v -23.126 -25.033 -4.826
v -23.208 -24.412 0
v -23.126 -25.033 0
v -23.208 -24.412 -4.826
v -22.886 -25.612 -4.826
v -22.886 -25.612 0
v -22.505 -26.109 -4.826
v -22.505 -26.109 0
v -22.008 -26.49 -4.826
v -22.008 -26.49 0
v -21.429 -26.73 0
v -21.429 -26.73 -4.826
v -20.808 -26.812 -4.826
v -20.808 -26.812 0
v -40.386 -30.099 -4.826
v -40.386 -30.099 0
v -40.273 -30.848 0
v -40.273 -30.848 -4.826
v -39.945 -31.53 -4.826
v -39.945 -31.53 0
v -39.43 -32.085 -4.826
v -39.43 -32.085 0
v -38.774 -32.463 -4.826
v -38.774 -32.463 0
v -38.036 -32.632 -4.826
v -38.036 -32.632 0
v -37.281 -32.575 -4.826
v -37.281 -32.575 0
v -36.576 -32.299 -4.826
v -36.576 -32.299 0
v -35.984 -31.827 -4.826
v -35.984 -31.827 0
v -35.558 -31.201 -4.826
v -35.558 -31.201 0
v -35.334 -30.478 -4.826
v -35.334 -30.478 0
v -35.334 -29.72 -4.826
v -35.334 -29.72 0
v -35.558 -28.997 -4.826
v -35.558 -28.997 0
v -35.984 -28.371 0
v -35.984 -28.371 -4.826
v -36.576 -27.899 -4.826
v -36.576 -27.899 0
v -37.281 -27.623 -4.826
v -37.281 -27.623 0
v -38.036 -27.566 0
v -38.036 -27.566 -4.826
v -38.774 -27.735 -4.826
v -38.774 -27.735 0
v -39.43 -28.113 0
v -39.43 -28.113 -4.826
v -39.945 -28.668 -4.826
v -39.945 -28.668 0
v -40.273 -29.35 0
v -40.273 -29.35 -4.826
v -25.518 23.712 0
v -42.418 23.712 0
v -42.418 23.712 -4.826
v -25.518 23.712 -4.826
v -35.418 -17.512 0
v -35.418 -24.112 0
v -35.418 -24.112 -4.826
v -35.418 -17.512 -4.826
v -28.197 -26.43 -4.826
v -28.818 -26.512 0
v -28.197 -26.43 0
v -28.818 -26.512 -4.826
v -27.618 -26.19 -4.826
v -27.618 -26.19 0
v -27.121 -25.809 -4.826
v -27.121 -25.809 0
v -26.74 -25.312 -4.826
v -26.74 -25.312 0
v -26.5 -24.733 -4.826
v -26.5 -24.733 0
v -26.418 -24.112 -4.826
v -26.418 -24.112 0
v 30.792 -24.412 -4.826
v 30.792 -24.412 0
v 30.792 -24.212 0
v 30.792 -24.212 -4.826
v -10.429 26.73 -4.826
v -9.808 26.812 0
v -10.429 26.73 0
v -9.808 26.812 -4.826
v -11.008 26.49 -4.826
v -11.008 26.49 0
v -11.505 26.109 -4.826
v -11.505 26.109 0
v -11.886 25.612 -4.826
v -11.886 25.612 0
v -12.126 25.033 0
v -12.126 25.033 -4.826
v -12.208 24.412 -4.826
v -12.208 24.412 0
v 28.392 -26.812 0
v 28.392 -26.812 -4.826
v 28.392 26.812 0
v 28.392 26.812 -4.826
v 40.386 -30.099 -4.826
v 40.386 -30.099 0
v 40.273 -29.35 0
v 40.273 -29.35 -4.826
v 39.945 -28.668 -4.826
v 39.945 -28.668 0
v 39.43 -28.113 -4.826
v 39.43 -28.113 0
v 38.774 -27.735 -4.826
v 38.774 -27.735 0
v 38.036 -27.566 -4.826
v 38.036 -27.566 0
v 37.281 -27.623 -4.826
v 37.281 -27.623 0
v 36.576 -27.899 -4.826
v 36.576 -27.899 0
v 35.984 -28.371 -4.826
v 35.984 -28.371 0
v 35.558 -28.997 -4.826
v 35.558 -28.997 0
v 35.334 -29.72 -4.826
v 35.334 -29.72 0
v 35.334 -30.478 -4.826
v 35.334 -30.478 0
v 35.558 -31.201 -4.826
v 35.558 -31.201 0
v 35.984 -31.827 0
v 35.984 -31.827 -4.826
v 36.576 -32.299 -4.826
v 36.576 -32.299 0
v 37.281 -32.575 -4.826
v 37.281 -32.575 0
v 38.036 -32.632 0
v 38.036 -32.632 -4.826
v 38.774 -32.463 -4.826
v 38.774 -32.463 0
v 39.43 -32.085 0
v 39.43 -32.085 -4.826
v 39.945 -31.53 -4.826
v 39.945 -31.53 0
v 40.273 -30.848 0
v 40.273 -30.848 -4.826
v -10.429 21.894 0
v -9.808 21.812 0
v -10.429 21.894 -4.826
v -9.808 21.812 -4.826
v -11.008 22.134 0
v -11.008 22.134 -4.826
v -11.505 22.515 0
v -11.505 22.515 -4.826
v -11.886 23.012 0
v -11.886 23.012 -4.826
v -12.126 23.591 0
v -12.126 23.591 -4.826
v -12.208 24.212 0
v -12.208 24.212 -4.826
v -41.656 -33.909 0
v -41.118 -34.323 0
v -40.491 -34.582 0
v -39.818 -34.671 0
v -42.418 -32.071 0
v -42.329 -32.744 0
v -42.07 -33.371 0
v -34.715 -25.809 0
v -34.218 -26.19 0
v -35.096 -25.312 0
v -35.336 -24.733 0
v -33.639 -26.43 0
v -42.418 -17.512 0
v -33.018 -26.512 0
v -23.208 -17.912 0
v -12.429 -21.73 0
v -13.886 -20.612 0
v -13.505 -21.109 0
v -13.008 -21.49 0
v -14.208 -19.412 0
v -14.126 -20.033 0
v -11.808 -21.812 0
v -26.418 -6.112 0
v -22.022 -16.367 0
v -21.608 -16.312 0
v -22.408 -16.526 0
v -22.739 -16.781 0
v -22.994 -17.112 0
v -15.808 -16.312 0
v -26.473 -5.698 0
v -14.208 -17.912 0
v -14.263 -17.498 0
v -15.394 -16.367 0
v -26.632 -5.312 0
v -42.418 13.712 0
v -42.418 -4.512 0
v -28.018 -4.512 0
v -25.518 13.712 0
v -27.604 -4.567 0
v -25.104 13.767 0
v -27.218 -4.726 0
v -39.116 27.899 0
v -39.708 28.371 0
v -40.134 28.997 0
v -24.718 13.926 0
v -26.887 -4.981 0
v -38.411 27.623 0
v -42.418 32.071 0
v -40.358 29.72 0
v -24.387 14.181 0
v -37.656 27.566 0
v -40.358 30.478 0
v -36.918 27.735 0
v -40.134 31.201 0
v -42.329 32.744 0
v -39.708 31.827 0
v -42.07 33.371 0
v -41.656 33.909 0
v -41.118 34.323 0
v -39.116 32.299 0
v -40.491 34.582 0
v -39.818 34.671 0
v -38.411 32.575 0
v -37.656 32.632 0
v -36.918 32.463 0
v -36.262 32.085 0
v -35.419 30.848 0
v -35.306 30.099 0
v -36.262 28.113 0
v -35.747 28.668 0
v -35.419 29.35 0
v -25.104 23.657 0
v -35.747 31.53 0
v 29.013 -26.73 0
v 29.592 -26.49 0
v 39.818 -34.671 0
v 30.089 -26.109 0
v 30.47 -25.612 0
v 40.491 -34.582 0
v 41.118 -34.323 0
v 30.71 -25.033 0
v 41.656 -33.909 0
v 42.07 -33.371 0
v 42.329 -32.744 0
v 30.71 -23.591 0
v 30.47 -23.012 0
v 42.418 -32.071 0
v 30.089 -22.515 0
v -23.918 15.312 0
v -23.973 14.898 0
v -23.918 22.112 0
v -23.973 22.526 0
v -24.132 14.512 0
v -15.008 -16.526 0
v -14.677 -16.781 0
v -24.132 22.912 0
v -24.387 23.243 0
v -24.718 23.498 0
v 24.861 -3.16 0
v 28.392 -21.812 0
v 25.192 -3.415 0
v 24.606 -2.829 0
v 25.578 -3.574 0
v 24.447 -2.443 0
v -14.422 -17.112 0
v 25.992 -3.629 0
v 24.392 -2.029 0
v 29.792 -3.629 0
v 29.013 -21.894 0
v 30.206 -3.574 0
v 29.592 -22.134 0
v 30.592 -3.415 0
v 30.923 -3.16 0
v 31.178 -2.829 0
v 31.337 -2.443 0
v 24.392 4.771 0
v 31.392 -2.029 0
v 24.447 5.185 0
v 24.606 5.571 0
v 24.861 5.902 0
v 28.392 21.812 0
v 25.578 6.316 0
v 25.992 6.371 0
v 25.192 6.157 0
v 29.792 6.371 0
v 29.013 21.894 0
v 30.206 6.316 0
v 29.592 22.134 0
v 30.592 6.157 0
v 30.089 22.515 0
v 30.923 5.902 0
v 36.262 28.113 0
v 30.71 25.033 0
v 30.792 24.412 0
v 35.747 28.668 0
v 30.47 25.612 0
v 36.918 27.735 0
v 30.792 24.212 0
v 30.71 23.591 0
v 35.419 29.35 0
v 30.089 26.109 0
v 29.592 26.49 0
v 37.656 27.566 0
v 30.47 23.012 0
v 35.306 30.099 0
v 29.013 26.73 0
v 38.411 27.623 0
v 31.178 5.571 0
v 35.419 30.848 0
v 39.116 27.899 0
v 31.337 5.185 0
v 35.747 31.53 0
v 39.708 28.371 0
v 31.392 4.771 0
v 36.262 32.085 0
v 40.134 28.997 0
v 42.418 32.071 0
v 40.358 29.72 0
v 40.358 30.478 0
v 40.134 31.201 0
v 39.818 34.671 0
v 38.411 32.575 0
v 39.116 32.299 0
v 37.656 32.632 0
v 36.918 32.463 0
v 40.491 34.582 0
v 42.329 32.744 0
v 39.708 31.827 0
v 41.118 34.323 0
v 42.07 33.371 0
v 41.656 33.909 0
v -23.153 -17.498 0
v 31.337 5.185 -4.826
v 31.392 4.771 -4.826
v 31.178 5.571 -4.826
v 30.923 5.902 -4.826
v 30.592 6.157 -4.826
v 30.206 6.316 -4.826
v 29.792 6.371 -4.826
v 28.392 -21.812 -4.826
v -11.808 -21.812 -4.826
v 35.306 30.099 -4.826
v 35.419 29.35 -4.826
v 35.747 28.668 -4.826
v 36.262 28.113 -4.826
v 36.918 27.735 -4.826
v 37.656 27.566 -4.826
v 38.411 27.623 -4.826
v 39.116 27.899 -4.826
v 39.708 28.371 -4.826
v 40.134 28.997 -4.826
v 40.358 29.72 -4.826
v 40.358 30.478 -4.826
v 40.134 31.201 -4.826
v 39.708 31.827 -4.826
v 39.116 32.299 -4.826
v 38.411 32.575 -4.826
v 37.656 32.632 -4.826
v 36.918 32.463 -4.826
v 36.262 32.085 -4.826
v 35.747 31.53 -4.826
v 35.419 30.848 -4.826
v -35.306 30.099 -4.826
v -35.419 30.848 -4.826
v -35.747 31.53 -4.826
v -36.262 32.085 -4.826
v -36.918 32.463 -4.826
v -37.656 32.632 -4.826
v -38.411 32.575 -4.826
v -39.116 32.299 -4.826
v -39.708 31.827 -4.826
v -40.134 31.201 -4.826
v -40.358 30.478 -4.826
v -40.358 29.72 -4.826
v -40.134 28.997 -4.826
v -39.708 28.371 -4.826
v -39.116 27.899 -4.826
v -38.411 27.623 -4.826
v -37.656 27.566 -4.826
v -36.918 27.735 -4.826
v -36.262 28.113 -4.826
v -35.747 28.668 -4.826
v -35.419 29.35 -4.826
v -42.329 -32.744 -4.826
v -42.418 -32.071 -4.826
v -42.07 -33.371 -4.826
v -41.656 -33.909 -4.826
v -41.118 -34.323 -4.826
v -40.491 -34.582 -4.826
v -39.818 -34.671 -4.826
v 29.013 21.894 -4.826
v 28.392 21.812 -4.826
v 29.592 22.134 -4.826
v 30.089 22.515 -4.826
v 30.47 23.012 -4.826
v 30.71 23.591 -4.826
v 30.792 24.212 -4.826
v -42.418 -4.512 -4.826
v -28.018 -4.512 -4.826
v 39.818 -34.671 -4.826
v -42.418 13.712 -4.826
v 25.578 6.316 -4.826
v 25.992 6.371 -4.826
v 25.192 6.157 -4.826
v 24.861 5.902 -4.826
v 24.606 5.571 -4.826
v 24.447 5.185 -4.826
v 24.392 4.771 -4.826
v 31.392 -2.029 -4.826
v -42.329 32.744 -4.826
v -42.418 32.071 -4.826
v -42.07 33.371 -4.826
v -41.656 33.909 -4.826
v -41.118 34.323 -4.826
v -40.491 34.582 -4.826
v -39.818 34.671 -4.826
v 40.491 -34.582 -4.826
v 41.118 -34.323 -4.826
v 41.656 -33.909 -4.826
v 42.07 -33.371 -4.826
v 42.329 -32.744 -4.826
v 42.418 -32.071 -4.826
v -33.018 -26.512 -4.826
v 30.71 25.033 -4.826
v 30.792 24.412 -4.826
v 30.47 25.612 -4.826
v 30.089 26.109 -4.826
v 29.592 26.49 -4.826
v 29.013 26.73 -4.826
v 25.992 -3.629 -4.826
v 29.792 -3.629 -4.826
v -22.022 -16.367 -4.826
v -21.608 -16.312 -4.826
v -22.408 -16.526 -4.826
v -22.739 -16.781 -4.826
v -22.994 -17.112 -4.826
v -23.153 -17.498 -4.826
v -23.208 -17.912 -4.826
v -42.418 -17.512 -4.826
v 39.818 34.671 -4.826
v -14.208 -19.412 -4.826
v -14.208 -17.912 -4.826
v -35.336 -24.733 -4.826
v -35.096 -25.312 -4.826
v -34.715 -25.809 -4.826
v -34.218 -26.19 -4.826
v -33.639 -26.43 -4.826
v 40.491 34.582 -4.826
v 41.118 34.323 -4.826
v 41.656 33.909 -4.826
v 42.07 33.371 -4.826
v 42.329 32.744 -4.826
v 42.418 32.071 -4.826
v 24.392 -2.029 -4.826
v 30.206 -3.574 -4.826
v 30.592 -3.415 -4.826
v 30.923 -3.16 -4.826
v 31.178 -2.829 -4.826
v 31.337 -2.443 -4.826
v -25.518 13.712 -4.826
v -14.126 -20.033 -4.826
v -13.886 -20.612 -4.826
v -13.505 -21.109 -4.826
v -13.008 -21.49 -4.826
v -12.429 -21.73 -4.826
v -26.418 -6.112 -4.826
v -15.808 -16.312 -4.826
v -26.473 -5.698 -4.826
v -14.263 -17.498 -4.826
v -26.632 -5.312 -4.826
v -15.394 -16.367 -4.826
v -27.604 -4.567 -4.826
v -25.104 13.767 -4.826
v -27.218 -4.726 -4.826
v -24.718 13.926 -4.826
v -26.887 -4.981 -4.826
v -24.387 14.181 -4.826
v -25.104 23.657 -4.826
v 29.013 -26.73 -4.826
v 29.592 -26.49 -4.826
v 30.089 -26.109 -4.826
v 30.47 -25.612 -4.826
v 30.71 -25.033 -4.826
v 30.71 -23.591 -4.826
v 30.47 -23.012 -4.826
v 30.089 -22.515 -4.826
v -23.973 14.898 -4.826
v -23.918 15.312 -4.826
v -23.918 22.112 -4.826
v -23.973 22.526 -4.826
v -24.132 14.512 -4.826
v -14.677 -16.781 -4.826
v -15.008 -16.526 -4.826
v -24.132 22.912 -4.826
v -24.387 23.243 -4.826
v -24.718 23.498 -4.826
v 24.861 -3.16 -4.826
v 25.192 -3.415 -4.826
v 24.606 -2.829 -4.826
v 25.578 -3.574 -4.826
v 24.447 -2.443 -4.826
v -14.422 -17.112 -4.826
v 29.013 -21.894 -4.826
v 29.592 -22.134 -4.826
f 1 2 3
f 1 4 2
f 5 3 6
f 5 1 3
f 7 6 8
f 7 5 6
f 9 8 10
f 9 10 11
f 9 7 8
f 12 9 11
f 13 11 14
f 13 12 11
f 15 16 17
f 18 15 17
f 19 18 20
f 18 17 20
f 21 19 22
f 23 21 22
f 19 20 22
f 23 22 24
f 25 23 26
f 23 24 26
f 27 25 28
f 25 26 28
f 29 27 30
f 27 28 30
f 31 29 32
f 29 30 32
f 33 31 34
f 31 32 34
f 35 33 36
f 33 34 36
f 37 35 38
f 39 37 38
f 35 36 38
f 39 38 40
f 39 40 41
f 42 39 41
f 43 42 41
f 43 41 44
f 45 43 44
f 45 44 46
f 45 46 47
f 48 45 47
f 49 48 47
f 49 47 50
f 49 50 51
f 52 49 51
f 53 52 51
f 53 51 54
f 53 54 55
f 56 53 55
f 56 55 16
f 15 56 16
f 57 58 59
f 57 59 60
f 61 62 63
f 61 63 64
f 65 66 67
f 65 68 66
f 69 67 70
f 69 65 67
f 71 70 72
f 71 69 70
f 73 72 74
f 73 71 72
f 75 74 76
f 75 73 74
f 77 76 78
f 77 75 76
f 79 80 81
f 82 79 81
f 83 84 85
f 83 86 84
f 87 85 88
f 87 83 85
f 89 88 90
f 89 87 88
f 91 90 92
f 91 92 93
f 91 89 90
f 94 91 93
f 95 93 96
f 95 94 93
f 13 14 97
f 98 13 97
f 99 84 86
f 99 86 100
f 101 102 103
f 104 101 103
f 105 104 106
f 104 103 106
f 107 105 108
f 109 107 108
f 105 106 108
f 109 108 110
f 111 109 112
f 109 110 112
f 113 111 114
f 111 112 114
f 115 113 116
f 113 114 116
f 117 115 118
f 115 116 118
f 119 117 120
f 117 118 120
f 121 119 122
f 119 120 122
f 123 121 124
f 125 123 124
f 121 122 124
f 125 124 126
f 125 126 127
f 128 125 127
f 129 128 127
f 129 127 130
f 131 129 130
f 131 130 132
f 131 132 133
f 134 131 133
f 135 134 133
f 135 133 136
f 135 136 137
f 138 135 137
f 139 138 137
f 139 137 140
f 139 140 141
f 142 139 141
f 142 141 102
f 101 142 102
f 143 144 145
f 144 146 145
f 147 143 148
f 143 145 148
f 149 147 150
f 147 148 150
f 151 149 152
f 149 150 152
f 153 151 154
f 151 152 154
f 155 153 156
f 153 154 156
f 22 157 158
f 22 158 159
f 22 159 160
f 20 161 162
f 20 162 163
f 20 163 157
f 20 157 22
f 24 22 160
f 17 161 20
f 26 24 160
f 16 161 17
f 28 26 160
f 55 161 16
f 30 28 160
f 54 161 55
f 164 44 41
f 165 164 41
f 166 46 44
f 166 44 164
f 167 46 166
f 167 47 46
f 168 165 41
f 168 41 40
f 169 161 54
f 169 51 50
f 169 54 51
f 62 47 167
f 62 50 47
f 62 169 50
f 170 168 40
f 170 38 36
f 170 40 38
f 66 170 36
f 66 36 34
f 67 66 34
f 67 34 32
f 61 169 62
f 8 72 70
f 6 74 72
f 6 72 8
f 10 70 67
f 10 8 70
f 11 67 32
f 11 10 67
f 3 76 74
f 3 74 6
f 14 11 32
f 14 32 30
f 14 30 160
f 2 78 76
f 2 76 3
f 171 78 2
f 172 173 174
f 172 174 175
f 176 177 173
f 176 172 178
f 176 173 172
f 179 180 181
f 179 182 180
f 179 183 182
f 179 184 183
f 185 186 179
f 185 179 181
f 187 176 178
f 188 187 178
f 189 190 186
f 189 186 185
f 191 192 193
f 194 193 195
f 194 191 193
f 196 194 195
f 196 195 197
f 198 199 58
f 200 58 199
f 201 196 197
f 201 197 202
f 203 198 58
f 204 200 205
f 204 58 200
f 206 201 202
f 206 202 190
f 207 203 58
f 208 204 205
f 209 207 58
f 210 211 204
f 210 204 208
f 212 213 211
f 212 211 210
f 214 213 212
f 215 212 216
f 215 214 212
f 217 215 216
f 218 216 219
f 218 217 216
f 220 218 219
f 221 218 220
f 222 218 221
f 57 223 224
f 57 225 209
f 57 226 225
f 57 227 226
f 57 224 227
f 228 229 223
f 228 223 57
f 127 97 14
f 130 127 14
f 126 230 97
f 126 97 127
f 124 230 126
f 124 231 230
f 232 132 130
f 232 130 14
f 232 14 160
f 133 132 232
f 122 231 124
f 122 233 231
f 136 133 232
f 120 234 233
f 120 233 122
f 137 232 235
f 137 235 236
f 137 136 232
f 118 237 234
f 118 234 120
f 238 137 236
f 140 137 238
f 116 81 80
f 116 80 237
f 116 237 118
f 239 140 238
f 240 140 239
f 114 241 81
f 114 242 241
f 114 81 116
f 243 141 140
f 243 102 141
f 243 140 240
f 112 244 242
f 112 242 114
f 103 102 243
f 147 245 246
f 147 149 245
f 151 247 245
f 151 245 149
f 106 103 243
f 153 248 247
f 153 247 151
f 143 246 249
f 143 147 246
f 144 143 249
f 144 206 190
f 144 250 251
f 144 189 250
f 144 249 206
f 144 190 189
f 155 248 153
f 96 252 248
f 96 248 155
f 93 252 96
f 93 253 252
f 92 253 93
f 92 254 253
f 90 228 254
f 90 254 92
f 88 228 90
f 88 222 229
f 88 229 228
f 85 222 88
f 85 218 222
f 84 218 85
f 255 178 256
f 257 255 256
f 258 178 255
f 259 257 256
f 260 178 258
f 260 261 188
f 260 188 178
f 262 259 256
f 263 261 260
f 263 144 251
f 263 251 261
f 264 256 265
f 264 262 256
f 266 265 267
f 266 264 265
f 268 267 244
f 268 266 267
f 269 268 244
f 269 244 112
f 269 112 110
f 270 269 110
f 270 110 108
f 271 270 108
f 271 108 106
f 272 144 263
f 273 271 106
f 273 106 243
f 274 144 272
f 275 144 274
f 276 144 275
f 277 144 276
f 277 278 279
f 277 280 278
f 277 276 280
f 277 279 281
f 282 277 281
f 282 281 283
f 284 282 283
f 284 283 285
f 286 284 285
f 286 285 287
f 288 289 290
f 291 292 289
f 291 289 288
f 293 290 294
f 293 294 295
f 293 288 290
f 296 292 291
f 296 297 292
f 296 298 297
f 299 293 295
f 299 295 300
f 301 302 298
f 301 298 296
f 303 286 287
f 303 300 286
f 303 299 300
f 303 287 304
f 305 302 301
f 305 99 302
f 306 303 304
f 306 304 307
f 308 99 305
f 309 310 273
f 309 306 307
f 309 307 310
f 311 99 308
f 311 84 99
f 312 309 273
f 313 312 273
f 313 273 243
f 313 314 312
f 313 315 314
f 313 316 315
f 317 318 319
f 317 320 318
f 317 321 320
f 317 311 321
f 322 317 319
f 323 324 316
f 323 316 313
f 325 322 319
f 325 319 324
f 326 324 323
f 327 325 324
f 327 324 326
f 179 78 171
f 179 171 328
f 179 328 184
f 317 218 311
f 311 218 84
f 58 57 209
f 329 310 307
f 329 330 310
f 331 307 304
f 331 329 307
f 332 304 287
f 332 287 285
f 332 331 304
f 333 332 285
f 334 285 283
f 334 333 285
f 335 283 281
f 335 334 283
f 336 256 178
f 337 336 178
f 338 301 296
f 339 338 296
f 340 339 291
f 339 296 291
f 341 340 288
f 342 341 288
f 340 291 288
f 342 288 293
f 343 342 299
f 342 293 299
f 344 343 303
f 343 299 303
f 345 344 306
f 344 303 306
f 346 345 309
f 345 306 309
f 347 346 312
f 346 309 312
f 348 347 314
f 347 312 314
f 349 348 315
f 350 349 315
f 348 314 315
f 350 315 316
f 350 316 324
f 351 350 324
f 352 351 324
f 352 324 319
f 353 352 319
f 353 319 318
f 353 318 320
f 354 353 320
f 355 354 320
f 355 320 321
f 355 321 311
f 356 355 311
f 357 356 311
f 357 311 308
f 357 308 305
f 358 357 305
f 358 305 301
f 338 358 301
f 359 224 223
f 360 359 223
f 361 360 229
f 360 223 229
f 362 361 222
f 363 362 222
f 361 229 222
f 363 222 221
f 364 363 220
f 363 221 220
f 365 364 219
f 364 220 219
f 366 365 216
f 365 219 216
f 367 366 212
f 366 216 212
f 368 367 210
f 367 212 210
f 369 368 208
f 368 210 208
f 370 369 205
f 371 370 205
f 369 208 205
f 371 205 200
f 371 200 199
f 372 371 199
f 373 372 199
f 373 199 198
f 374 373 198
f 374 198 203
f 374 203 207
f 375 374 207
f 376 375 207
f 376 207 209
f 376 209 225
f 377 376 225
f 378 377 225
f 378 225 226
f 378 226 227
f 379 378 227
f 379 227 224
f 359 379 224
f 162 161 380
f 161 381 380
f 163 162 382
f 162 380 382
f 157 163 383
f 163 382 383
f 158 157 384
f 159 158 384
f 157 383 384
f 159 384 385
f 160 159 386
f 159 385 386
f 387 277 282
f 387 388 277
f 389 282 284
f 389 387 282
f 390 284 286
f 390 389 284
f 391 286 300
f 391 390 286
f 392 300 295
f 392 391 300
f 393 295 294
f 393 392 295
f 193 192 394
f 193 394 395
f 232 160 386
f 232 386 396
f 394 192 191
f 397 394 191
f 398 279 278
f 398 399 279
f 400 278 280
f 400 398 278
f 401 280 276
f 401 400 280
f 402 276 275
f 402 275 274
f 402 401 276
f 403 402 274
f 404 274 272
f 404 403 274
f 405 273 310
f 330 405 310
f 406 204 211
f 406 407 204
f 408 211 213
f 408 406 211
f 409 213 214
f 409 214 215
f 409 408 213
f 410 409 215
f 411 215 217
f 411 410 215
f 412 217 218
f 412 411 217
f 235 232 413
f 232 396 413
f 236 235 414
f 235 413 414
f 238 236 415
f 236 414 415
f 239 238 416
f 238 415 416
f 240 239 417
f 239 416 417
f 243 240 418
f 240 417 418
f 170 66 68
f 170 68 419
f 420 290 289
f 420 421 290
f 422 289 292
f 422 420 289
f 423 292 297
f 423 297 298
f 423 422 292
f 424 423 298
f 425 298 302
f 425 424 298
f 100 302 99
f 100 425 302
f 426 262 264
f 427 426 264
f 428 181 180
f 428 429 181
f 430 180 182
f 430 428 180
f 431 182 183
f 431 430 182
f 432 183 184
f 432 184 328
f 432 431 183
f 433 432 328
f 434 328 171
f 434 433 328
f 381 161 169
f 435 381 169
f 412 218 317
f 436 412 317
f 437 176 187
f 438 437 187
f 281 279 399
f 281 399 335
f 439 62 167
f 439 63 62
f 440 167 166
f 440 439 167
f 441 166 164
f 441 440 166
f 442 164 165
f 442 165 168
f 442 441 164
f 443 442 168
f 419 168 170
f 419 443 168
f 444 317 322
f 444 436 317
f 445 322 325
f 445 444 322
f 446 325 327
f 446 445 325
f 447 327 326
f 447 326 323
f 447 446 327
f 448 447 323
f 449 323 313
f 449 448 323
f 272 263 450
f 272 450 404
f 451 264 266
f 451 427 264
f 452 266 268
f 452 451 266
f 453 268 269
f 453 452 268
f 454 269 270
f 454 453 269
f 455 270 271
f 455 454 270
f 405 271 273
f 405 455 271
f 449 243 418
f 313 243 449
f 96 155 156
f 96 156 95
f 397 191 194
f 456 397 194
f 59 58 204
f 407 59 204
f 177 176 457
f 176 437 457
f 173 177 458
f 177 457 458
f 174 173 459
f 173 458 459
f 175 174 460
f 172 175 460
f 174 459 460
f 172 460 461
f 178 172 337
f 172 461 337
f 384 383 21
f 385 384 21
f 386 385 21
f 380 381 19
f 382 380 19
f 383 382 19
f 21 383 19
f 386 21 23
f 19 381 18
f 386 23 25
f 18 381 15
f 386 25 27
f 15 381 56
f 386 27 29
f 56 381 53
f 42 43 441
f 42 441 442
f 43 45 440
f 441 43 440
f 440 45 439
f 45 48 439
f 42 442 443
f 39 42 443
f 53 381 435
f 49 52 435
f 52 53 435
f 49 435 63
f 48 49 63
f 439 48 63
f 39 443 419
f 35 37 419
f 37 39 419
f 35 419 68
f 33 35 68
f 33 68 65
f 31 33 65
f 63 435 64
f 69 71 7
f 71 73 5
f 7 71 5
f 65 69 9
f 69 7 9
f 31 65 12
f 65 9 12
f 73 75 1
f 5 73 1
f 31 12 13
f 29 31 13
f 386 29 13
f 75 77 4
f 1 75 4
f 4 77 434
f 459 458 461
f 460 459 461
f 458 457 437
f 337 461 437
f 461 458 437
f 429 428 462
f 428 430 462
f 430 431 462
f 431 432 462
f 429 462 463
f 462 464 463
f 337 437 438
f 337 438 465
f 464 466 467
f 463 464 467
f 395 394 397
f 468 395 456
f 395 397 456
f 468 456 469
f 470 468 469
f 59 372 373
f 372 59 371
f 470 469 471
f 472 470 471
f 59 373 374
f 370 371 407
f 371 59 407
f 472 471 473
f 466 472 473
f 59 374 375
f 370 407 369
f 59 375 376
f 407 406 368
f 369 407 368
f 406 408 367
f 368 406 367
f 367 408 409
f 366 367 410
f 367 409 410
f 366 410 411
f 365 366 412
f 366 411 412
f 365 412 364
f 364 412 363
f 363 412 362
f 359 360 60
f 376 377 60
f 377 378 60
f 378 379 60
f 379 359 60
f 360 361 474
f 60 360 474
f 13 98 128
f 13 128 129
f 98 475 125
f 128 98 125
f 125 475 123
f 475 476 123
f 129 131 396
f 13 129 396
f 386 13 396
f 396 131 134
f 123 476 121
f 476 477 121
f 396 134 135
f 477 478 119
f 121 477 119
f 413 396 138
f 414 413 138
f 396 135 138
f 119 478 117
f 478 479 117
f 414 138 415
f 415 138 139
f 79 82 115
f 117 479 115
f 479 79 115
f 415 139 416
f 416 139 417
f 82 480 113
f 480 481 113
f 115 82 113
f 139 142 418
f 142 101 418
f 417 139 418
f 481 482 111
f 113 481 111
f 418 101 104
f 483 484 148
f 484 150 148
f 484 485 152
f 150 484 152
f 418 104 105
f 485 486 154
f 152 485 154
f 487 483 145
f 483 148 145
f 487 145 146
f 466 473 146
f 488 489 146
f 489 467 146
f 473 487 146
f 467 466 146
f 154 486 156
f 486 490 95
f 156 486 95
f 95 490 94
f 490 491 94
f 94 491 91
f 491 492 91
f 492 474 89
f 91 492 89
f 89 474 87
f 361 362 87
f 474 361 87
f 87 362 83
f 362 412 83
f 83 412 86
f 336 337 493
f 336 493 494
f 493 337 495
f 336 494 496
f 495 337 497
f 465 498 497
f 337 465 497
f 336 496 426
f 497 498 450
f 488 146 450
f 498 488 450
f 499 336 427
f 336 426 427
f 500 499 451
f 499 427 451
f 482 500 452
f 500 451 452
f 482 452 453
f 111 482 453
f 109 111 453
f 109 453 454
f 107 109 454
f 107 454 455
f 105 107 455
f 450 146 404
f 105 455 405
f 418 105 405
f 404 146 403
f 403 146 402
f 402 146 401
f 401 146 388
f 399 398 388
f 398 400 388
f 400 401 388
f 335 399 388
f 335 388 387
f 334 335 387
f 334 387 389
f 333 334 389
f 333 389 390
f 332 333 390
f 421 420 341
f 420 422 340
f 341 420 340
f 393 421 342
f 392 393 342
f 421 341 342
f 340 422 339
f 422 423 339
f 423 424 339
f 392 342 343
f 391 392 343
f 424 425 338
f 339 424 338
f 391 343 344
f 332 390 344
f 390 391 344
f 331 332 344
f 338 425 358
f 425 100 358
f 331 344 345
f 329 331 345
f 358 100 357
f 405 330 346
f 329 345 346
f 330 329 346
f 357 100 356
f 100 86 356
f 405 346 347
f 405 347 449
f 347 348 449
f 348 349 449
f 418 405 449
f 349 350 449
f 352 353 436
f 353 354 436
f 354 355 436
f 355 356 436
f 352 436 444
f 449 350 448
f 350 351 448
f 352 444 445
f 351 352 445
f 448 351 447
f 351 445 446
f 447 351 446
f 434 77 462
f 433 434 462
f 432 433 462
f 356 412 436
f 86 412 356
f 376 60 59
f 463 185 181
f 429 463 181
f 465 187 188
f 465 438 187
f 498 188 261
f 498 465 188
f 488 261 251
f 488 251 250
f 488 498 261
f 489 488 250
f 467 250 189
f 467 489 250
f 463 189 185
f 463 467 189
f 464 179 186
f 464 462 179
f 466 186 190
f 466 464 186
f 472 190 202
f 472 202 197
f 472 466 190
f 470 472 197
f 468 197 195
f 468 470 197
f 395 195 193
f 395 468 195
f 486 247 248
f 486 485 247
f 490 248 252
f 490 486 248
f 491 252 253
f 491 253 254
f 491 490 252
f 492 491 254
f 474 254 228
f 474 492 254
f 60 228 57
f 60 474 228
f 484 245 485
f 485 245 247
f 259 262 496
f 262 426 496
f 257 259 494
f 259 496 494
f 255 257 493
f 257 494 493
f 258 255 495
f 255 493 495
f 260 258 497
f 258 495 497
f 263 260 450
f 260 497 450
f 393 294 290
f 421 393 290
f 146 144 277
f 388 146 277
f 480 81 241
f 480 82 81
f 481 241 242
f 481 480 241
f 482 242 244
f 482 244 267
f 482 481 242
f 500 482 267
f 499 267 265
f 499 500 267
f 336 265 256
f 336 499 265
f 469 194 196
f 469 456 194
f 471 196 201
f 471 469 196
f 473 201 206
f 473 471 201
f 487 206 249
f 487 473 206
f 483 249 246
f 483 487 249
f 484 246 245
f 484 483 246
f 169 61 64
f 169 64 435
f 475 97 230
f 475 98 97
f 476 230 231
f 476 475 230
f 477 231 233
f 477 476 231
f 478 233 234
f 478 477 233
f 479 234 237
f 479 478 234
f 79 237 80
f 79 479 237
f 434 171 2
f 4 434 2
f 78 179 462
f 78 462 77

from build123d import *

# Parameters (mm, degrees)
SKETCH1_W          = 84.836
SKETCH1_H          = 69.342
BASE_FLANGE1_DEPTH = 4.826
SKETCH6_R          = 2.54
CUT_EXTRUDE1_DEPTH = 10
FILLET1_R          = 2.6
SKETCH7_W          = 18.5
SKETCH7_H          = 10
SKETCH7_W_2        = 43
SKETCH7_H_2        = 5
SKETCH7_W_3        = 7
CUT_EXTRUDE2_DEPTH = 4.826
FILLET2_R          = 2.4
FILLET3_R          = 1.6


# Sheet-metal steps are written as plain solids
with BuildPart() as part:
    # Sketch1 → Base-Flange1 (new body)
    with BuildSketch(Plane.XY):
        Rectangle(SKETCH1_W, SKETCH1_H)
    extrude(amount=-BASE_FLANGE1_DEPTH)

    # Sketch6 → Cut-Extrude1 (cut)
    with BuildSketch(Plane.XY):
        with Locations((-37.846, 30.099)):
            Circle(SKETCH6_R)
        with Locations(Location((-37.846, -30.099, 0), (0, 0, 180))):
            Circle(SKETCH6_R)
        with Locations((37.846, -30.099)):
            Circle(SKETCH6_R)
        with Locations(Location((37.846, 30.099, 0), (0, 0, 180))):
            Circle(SKETCH6_R)
    extrude(amount=-CUT_EXTRUDE1_DEPTH, mode=Mode.SUBTRACT)

    # Fillet1
    fillet1_edges = [part.edges().sort_by_distance(p)[0] for p in [
        (-42.418, 34.671, -2.413),
        (42.418, 34.671, -2.413),
        (42.418, -34.671, -2.413),
        (-42.418, -34.671, -2.413),
    ]]
    fillet(fillet1_edges, radius=FILLET1_R)

    # Sketch7 → Cut-Extrude2 (cut)
    with BuildSketch(Plane.XY):
        with Locations((-33.168, 18.7119922)):
            Rectangle(SKETCH7_W, SKETCH7_H)
        Polygon((-42.418, -4.5120046), (-26.418, -4.5120046), (-26.418, -26.512012), (-35.418, -26.512012), (-35.418, -17.5120046), (-42.418, -17.5120046), align=None)
        with Locations((9.2919882, 24.3120114)):
            Rectangle(SKETCH7_W_2, SKETCH7_H_2)
        Polygon((-14.2080118, -21.81200997), (-14.2080118, -16.31199997), (-23.2080118, -16.31199997), (-23.2080118, -26.81199997), (30.7919882, -26.81199997), (30.7919882, -21.81200997), align=None)
        with Locations((27.8920124, 1.371)):
            Rectangle(SKETCH7_W_3, SKETCH7_H)
    extrude(amount=-CUT_EXTRUDE2_DEPTH, mode=Mode.SUBTRACT)

    # Fillet2
    fillet2_edges = [part.edges().sort_by_distance(p)[0] for p in [
        (-12.2080118, 21.8120114, -2.413),
        (-12.2080118, 26.8120114, -2.413),
        (30.7919882, 26.8120114, -2.413),
        (30.7919882, 21.8120114, -2.413),
        (30.7919882, -21.81200997, -2.413),
        (30.7919882, -26.81199997, -2.413),
        (-23.2080118, -26.81199997, -2.413),
        (-14.2080118, -21.81200997, -2.413),
        (-26.418, -26.512012, -2.413),
        (-35.418, -26.512012, -2.413),
    ]]
    fillet(fillet2_edges, radius=FILLET2_R)

    # Fillet3
    fillet3_edges = [part.edges().sort_by_distance(p)[0] for p in [
        (24.3920124, -3.629, -2.413),
        (24.3920124, 6.371, -2.413),
        (31.3920124, 6.371, -2.413),
        (31.3920124, -3.629, -2.413),
        (-23.2080118, -16.31199997, -2.413),
        (-14.2080118, -16.31199997, -2.413),
        (-23.918, 23.7119922, -2.413),
        (-23.918, 13.7119922, -2.413),
        (-26.418, -4.5120046, -2.413),
    ]]
    fillet(fillet3_edges, radius=FILLET3_R)


solid = part.part
